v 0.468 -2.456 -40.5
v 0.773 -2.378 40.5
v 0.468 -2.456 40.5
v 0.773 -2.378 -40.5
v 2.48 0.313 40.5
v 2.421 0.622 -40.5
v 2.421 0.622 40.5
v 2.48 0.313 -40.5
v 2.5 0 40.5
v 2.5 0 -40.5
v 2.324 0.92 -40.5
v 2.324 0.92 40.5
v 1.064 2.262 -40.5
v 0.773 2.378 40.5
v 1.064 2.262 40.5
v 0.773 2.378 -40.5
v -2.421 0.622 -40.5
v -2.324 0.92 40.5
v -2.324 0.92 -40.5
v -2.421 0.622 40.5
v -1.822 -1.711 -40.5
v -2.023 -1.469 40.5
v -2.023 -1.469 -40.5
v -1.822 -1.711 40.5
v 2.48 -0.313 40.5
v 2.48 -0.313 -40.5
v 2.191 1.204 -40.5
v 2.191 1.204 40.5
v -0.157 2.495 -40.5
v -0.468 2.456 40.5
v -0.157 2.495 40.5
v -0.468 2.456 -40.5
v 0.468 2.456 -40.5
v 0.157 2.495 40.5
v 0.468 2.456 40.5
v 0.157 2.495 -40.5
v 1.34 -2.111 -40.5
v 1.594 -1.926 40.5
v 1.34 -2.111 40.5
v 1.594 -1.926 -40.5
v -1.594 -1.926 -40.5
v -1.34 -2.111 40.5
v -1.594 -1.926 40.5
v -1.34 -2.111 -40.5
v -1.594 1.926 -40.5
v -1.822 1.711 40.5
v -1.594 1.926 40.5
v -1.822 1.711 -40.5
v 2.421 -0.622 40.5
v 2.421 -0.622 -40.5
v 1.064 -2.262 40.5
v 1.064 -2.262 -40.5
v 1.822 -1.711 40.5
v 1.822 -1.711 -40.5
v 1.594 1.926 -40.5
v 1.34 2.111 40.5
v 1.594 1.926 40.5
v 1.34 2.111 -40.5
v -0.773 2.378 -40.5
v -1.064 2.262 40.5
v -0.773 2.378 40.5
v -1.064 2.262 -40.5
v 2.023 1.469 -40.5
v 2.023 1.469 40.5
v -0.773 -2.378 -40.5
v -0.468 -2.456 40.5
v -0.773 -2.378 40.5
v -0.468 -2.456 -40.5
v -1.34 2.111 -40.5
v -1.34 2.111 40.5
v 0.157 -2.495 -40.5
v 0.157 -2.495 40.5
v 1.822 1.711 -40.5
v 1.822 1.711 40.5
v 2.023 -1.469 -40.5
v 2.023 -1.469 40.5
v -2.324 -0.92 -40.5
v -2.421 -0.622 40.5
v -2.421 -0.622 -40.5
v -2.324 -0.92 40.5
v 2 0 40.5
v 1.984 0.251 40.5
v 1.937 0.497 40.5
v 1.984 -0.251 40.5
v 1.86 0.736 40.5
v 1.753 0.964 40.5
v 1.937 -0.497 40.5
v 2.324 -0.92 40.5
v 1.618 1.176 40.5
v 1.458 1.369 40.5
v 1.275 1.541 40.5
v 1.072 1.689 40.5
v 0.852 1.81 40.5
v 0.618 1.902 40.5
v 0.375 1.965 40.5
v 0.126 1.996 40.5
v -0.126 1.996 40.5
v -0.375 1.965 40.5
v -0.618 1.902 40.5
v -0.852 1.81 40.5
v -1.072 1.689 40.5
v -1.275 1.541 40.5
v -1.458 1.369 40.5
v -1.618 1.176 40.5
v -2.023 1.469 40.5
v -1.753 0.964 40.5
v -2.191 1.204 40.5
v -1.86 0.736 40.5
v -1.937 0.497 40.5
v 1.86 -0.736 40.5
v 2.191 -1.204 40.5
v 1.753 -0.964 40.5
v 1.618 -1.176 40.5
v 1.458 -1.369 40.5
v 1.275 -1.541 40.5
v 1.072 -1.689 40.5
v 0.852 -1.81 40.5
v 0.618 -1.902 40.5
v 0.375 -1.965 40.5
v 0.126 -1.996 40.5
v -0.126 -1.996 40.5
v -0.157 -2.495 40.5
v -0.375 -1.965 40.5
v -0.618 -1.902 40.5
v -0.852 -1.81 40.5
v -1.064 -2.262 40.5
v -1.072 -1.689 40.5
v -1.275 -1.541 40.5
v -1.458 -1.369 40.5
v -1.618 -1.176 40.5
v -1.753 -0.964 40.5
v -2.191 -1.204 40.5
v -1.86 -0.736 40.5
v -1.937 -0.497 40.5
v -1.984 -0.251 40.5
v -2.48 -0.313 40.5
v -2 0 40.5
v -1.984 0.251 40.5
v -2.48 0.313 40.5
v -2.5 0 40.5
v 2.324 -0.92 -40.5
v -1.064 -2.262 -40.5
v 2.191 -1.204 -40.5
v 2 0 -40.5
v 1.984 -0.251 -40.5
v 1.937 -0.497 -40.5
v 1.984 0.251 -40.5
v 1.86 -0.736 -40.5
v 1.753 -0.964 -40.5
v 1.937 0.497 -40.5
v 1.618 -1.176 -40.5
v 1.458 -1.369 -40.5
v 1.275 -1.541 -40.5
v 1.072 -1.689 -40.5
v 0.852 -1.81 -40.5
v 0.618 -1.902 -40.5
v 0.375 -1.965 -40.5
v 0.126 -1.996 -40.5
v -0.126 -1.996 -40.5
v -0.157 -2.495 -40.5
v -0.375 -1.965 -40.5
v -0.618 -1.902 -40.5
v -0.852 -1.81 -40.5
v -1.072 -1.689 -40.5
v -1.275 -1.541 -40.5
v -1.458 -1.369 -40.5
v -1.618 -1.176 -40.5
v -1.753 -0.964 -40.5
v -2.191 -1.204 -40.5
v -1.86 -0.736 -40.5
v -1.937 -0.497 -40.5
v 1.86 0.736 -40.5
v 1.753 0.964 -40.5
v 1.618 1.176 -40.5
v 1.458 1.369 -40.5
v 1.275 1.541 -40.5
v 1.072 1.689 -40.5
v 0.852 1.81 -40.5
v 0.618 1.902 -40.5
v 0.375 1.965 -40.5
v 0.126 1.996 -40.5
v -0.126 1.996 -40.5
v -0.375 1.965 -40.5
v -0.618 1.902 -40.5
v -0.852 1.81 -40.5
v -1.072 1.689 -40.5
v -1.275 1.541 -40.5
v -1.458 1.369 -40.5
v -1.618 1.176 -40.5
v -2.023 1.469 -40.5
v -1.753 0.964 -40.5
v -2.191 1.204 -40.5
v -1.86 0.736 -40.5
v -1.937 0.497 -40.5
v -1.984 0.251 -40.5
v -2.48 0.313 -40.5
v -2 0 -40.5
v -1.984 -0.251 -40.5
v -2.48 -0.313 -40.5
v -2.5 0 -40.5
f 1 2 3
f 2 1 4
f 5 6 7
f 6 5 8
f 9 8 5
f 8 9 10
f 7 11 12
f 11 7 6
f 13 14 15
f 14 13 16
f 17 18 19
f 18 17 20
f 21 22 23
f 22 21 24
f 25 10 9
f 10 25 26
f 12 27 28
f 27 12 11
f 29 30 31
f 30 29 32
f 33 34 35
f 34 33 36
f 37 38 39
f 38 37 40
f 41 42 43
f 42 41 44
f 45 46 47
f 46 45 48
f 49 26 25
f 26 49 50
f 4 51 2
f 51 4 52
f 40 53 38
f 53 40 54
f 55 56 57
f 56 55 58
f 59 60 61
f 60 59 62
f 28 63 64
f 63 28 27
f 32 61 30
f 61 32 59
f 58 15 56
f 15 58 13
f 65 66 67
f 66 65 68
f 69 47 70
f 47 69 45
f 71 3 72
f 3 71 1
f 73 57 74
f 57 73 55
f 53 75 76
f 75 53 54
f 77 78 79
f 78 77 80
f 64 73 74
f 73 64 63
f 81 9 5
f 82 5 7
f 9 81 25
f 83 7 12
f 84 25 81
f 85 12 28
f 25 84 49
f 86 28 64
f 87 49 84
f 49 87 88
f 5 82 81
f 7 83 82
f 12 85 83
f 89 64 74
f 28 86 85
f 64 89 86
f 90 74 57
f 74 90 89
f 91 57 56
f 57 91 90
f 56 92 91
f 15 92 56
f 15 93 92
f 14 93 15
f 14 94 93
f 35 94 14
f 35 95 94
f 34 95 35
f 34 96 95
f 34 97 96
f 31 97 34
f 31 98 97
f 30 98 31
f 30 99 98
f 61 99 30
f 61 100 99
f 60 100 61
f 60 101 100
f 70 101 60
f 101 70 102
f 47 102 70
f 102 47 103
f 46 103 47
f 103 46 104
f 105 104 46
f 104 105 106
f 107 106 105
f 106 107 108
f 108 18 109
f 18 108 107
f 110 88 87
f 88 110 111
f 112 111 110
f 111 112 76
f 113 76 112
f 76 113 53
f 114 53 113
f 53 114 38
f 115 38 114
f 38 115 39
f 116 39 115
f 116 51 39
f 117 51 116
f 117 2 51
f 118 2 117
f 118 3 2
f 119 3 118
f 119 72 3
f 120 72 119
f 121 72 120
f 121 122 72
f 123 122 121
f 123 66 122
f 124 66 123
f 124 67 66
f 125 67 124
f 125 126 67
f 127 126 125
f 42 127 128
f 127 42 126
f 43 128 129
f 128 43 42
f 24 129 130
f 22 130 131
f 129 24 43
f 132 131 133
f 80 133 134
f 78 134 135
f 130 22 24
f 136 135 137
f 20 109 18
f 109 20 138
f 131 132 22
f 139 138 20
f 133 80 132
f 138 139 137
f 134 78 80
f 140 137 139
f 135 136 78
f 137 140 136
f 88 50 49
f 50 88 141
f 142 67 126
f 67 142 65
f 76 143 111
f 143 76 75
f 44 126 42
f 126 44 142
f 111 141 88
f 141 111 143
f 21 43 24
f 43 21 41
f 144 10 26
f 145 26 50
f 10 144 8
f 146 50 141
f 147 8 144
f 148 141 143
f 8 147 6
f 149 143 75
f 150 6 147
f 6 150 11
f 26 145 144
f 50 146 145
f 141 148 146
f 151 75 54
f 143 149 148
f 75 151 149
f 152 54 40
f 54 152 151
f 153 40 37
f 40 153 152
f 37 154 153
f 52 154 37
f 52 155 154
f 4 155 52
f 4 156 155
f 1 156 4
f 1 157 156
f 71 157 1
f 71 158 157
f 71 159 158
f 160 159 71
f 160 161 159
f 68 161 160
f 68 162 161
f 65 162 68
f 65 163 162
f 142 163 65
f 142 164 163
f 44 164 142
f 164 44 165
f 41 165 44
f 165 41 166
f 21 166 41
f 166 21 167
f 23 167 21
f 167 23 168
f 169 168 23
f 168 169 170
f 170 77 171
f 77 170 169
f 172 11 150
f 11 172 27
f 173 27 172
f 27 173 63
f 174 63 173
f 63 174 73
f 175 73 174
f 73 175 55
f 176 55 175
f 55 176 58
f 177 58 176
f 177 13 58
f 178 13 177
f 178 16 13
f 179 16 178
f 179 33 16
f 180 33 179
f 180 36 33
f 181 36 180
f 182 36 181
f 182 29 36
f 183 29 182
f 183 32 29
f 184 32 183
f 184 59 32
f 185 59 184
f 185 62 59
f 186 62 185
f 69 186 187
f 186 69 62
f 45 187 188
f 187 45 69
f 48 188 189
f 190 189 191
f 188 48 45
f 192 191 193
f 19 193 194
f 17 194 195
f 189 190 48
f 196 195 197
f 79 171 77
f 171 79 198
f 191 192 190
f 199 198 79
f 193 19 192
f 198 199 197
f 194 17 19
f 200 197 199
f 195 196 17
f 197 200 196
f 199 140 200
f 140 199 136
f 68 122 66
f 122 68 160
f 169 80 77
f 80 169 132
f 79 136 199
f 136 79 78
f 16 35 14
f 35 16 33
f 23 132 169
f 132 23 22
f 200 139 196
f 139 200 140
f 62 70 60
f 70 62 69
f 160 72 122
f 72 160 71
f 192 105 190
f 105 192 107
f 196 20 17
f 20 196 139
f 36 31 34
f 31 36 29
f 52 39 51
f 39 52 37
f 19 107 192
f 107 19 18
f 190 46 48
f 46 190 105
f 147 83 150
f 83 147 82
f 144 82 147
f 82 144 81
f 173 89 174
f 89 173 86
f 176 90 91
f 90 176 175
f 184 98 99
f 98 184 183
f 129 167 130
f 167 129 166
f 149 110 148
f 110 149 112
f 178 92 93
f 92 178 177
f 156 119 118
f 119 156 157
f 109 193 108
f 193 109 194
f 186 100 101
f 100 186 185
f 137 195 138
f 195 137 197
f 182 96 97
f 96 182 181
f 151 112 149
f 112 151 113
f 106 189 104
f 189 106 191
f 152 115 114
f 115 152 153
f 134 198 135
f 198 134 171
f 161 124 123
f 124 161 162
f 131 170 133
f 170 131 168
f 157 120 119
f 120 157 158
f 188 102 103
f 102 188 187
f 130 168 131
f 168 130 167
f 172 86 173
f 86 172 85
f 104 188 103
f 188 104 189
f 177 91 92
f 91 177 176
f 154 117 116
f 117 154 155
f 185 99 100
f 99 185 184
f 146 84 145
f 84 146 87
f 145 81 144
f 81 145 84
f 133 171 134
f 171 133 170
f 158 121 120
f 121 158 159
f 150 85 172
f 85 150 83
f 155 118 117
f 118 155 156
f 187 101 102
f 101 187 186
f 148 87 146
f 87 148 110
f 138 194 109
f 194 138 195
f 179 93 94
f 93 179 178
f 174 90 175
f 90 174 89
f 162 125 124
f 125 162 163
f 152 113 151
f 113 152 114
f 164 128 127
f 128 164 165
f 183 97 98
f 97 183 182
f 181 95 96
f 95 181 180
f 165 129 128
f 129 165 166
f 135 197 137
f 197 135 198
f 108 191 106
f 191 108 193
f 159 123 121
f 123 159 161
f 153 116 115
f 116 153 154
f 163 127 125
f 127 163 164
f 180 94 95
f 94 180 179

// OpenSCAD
$fn = 50;


difference() {
	union() {
		translate(v = [0, 0, -40.5000000000]) {
			cylinder(h = 81, r = 2.5000000000);
		}
	}
	union() {
		translate(v = [0, 0, -100.0000000000]) {
			cylinder(h = 200, r = 2.0000000000);
		}
	}
}
